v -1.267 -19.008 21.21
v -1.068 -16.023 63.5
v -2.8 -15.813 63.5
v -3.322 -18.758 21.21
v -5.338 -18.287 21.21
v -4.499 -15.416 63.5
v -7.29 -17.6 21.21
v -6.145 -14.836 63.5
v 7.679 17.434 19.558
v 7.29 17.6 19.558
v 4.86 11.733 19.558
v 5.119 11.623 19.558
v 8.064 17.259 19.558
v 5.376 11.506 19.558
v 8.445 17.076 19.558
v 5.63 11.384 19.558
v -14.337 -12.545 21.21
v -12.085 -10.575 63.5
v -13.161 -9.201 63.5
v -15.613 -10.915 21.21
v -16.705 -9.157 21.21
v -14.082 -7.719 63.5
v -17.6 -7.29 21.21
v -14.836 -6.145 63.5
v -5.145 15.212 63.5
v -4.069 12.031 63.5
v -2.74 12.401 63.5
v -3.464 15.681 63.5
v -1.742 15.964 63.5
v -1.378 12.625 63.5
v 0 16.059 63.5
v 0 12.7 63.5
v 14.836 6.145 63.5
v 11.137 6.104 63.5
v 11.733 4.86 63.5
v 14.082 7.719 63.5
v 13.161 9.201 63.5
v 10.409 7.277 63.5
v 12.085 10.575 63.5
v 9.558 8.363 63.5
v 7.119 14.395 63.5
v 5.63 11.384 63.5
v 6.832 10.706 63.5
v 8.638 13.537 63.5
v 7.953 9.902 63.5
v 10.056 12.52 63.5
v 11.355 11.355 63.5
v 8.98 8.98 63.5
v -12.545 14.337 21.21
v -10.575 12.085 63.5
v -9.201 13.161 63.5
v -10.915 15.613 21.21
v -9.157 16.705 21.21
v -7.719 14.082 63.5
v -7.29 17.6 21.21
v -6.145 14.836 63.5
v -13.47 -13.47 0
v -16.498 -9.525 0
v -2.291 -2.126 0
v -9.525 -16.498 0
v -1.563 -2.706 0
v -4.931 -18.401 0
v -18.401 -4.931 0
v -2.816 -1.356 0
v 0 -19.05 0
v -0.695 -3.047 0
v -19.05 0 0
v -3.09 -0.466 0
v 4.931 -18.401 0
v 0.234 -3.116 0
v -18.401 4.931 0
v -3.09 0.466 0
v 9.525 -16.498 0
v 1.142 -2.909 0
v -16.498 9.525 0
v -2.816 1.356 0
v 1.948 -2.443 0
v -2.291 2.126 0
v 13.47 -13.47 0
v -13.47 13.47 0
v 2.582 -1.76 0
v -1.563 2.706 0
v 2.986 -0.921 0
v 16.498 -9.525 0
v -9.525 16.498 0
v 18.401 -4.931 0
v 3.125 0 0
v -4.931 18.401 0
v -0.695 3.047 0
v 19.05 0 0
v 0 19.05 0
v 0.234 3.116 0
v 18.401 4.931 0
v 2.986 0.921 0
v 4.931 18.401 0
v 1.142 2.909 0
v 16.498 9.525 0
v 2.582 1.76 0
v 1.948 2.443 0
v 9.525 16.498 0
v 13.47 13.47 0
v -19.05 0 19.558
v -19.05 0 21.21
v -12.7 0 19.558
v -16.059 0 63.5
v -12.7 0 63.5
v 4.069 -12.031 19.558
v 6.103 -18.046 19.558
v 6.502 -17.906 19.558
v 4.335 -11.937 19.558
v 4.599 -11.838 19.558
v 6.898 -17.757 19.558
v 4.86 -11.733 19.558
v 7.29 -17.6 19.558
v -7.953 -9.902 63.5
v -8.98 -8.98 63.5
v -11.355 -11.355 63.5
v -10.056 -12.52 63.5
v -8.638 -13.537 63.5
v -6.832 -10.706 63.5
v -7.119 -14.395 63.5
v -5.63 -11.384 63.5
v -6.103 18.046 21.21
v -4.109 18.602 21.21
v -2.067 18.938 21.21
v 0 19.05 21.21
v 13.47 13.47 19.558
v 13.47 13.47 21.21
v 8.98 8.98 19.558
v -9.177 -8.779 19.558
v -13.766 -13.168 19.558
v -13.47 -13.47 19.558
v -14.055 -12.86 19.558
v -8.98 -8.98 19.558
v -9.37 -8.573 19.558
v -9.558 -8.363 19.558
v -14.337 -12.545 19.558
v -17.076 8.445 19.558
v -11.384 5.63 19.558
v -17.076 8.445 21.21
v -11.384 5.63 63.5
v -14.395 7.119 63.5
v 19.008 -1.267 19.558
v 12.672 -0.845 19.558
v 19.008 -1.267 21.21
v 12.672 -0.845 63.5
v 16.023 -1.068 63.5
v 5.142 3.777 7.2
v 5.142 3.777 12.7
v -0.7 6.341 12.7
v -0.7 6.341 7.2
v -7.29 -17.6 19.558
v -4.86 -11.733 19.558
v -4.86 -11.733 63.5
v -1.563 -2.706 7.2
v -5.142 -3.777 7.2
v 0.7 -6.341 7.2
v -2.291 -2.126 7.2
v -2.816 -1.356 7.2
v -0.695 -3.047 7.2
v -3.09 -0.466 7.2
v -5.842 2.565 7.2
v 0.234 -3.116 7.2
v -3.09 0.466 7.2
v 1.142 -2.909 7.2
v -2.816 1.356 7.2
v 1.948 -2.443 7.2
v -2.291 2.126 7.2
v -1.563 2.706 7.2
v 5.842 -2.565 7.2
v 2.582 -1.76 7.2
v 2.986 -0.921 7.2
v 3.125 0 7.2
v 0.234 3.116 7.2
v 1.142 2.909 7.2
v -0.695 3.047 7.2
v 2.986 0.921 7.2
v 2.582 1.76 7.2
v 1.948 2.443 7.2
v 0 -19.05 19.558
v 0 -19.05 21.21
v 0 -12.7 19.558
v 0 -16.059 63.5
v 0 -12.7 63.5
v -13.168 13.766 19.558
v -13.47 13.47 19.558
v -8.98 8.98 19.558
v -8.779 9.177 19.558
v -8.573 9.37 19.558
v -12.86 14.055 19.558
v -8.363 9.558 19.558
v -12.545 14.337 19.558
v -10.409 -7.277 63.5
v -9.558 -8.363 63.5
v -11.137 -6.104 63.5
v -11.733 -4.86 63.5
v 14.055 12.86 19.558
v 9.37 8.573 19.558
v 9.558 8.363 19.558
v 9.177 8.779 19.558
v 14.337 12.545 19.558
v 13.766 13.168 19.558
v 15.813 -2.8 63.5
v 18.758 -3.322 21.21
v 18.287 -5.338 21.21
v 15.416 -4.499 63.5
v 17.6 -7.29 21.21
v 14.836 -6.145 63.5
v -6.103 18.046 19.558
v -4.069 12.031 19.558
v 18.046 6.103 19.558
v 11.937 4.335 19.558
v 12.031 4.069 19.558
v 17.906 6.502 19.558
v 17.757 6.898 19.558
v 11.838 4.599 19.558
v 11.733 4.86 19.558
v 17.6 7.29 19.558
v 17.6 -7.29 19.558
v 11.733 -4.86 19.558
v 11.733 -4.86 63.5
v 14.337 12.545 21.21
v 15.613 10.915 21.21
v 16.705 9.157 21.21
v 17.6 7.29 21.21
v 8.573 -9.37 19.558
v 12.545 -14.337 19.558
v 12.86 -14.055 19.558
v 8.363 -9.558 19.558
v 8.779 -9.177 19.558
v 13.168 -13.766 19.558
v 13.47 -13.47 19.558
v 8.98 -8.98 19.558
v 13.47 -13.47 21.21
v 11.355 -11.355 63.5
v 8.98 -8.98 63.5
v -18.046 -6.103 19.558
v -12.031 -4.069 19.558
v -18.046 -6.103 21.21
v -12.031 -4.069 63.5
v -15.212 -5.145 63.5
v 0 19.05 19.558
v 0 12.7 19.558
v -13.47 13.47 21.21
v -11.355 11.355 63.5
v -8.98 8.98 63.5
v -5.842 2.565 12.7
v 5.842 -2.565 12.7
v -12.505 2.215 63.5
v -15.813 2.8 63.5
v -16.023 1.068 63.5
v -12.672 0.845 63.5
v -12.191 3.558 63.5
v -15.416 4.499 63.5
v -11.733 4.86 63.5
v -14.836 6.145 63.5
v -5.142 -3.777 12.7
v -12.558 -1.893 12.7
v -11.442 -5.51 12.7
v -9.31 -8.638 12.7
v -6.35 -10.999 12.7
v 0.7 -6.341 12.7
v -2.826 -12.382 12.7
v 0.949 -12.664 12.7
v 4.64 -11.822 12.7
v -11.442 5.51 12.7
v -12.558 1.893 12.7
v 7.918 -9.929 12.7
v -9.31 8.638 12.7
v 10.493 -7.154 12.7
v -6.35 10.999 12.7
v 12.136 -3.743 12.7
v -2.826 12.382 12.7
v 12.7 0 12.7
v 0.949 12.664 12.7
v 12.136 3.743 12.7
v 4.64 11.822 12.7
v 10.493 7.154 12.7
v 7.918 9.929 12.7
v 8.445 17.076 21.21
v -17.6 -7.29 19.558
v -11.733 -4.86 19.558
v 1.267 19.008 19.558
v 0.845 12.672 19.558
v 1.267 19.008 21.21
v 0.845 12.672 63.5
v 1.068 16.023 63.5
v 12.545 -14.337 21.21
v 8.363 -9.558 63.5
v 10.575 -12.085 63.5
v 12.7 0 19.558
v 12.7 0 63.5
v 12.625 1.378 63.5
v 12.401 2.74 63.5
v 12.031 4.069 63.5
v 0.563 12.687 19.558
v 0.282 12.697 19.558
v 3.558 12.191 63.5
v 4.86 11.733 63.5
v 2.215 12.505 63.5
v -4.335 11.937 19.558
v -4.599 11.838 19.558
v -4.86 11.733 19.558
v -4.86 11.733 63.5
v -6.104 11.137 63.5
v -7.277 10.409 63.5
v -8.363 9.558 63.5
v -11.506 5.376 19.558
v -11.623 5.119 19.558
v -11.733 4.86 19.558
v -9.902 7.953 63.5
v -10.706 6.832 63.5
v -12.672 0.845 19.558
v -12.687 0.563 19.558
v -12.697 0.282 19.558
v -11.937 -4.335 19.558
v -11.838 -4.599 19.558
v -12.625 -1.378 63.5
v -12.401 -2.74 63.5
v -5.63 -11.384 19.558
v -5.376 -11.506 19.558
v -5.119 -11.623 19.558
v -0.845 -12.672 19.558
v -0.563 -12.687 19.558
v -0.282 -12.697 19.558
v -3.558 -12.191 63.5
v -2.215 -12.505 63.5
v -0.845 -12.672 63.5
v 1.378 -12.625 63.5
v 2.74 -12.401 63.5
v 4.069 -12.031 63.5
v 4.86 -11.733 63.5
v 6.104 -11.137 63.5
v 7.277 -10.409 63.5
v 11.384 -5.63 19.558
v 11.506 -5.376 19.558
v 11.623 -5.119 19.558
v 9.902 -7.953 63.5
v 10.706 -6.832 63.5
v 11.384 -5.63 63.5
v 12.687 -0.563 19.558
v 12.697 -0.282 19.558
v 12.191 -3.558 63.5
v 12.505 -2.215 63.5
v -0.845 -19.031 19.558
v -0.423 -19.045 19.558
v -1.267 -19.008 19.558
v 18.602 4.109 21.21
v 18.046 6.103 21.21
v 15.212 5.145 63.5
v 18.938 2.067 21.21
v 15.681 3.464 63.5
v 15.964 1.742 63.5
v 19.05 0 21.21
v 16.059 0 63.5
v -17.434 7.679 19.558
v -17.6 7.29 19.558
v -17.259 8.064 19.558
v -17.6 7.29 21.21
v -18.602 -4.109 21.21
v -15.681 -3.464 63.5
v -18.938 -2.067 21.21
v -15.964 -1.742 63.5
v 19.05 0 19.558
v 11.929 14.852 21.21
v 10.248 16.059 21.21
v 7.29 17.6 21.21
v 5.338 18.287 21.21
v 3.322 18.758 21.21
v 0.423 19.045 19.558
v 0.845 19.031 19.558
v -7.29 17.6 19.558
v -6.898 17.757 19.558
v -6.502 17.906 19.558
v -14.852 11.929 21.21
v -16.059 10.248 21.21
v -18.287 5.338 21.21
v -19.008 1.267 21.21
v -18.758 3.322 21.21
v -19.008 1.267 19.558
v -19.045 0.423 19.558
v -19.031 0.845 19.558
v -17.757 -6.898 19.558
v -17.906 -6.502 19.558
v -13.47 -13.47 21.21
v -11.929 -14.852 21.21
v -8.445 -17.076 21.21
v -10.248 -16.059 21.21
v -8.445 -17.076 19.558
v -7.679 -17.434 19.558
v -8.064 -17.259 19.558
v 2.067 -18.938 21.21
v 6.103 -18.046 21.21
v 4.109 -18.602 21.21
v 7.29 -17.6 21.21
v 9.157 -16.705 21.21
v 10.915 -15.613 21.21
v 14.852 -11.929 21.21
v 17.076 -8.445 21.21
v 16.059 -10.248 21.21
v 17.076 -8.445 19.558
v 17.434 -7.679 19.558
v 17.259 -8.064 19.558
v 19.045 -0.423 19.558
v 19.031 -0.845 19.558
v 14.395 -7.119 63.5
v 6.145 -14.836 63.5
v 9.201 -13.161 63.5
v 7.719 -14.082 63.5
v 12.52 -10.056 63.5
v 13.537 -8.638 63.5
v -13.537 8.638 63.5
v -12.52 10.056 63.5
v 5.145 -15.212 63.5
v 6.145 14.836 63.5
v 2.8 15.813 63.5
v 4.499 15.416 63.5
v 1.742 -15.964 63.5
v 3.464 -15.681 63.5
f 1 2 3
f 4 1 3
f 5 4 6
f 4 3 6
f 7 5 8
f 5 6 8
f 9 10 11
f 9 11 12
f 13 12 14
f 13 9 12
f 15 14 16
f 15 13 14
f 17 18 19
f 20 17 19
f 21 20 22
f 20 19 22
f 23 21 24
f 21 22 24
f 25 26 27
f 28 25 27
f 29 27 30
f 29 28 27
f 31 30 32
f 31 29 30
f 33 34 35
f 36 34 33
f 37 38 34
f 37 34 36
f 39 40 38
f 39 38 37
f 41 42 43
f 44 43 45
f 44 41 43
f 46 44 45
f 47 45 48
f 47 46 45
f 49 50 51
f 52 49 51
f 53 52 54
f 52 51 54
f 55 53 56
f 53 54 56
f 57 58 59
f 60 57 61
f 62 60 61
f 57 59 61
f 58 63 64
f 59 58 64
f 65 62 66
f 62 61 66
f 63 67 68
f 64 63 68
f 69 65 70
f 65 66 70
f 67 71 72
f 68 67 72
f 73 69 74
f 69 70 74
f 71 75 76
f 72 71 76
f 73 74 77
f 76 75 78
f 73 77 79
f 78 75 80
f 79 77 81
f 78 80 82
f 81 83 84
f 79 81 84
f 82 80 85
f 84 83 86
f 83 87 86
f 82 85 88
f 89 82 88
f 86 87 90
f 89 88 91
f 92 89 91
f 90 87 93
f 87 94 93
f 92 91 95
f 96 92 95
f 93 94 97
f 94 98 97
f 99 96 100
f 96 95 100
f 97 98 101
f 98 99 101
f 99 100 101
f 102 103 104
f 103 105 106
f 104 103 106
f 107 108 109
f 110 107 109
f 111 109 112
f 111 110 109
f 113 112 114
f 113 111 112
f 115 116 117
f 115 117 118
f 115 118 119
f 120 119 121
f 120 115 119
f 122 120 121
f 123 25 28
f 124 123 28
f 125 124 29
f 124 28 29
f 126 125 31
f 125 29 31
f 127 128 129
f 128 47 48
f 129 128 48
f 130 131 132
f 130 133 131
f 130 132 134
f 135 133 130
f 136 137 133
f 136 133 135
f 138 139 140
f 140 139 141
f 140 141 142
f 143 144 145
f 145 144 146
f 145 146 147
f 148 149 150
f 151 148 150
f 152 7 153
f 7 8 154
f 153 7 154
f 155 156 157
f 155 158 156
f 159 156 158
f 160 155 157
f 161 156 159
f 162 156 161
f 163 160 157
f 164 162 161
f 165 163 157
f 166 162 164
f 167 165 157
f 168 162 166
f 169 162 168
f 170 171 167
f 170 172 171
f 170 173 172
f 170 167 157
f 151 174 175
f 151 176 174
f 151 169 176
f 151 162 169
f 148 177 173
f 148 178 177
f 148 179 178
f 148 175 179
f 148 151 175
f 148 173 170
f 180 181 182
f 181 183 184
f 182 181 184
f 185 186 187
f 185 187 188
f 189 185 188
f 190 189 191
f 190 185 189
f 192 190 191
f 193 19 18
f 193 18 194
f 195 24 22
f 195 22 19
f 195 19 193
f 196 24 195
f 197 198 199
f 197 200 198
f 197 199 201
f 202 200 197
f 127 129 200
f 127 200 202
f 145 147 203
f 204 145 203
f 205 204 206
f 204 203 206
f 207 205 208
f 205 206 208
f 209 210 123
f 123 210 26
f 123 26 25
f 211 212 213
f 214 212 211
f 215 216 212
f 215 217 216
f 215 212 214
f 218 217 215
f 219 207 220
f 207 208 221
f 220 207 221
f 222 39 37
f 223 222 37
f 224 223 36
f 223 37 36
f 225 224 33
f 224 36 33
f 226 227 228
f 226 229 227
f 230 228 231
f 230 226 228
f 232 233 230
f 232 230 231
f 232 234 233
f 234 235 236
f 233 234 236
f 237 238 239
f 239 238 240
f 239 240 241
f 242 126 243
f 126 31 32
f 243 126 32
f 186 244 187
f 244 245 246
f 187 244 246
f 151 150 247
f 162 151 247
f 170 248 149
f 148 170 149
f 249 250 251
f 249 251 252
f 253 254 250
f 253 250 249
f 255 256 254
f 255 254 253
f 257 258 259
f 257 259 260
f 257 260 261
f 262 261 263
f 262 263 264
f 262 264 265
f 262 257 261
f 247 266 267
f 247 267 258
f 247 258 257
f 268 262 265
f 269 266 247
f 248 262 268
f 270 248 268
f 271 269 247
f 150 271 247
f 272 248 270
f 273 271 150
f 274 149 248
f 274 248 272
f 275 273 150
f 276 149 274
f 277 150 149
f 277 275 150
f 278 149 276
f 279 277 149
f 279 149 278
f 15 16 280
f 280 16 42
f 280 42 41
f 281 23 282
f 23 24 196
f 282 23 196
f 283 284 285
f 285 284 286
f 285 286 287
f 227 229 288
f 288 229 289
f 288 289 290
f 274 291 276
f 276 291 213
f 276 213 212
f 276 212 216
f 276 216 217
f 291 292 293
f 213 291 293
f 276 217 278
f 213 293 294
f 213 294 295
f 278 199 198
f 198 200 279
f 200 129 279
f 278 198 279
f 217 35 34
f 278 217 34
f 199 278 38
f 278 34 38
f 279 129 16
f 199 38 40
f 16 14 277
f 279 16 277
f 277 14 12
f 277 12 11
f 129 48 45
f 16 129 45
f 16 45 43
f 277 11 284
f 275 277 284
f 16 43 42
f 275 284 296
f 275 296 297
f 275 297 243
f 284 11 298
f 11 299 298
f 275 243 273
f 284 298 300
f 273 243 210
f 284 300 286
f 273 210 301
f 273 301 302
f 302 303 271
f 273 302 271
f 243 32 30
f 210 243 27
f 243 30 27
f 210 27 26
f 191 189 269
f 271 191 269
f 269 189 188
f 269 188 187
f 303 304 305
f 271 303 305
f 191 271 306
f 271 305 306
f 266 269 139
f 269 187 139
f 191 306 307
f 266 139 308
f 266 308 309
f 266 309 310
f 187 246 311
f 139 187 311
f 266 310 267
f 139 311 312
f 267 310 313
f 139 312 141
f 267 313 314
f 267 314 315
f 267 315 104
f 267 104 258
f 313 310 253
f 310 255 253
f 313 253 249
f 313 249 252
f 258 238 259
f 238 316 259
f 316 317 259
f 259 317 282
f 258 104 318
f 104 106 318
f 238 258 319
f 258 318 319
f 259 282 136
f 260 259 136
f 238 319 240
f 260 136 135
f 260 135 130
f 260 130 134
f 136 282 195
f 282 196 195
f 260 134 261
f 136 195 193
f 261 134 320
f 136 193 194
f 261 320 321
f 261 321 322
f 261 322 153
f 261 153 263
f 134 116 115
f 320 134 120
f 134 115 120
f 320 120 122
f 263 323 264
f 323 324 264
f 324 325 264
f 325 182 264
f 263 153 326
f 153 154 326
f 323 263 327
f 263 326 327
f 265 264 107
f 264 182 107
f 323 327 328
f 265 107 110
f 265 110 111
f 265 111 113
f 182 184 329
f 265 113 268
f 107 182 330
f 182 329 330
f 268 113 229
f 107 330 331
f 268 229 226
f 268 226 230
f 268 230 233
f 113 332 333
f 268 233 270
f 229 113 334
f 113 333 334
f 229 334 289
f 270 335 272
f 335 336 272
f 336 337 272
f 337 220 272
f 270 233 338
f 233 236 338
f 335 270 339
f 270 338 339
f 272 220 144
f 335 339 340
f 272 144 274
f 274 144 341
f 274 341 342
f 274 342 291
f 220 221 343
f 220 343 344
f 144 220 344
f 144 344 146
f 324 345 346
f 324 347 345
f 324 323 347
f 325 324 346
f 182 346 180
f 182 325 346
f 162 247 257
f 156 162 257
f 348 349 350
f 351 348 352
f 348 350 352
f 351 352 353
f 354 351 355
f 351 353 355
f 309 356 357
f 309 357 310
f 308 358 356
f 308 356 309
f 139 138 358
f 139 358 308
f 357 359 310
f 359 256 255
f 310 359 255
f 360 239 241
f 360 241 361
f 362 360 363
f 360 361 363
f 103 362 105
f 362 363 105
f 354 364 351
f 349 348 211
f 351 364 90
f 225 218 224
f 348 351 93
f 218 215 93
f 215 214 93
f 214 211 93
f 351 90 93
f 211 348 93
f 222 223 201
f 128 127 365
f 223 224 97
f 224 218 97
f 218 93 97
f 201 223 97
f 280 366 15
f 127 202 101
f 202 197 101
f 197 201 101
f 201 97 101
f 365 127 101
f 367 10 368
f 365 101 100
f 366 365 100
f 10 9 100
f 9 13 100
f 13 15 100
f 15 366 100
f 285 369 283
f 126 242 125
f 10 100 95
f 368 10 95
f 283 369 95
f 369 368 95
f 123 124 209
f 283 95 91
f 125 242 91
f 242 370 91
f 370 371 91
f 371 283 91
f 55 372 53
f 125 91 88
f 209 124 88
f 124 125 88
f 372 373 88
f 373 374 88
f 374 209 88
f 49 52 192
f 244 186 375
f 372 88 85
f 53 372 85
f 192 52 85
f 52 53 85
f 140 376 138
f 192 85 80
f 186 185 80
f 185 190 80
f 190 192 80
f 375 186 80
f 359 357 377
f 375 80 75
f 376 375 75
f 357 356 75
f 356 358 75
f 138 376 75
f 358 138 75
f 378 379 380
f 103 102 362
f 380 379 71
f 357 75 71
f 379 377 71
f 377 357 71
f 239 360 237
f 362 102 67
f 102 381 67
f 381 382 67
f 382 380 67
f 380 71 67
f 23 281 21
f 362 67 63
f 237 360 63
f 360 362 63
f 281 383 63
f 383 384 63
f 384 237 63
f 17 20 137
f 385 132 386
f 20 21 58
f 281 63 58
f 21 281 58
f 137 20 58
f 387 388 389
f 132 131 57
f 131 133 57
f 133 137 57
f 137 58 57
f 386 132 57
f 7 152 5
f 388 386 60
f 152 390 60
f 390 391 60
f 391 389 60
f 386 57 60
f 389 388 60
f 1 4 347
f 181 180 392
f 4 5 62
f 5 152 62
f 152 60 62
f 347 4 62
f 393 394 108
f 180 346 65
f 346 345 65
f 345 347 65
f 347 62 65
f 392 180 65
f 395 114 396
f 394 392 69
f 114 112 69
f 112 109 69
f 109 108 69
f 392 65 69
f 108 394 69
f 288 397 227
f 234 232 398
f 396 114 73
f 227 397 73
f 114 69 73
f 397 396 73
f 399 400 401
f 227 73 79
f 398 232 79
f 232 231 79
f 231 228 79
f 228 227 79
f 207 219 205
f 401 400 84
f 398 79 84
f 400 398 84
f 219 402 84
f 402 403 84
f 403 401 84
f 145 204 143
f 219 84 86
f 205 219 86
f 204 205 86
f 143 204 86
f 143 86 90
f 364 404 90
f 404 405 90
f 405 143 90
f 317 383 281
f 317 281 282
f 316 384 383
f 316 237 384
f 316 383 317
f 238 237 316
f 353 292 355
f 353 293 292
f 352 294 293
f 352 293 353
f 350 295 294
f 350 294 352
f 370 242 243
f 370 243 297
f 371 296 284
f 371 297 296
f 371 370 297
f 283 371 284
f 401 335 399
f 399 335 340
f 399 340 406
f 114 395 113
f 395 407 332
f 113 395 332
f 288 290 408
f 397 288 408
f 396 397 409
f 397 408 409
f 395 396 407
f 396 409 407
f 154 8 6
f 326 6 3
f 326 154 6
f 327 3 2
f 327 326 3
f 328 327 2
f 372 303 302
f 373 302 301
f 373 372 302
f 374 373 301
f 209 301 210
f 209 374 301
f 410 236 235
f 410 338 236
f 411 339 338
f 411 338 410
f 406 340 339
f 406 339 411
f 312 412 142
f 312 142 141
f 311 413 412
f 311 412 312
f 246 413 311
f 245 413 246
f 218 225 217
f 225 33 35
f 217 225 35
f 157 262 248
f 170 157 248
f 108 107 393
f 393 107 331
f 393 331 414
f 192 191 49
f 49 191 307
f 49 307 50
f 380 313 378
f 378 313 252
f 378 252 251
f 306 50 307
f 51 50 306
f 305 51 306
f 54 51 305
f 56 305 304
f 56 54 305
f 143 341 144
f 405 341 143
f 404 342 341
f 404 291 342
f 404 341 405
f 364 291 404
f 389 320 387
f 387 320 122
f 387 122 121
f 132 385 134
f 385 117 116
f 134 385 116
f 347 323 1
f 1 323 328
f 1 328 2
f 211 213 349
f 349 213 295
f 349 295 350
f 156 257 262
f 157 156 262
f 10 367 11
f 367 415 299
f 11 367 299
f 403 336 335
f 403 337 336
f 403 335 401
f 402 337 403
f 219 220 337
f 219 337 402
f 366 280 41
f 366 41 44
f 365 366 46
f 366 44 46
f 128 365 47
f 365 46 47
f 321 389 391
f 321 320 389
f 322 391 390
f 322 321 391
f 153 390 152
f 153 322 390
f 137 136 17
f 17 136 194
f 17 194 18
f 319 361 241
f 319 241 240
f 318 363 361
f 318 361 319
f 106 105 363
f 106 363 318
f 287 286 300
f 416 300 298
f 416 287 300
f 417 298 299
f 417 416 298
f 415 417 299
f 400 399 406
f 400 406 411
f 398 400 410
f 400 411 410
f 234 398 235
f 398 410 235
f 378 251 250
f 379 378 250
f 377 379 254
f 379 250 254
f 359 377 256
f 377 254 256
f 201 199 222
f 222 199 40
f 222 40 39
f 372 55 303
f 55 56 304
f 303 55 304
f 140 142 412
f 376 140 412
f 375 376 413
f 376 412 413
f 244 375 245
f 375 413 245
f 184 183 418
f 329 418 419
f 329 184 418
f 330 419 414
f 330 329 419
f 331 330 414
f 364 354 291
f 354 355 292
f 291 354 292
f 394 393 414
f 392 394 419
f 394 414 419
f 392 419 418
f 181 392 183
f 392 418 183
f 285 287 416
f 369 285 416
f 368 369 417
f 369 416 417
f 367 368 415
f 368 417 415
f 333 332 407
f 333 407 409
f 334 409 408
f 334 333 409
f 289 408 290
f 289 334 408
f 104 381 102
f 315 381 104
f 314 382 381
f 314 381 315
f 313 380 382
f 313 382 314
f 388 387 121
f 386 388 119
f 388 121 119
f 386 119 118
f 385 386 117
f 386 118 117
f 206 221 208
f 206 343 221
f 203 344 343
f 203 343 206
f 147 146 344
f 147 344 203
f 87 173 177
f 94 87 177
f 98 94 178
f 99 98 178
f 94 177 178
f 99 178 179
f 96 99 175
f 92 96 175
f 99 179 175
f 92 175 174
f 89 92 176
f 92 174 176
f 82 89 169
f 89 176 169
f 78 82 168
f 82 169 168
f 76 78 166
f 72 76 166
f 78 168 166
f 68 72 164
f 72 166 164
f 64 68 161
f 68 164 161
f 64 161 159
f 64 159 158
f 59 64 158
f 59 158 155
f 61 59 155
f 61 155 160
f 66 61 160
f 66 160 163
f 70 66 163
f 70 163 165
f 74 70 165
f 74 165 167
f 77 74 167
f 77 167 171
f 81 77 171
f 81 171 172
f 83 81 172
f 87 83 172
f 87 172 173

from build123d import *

# Parameters (mm, degrees)
F0_R      = 19.05
F1_DEPTH  = 63.5
F3_R      = 12.7
F4_DEPTH  = 50.8
F6_DEPTH  = 43.942
F7_R      = 3.125
F8_DEPTH  = 53.594
F10_DEPTH = 5.5


with BuildPart() as f1:
    # F0 (on Top) → F1 (new body)
    with BuildSketch(Plane.XY):
        Circle(F0_R)
    extrude(amount=F1_DEPTH)

    # F3 (on face) → F4 (cut)
    with BuildSketch(Plane.XY.offset(63.5)):
        Circle(F3_R)
    extrude(amount=-F4_DEPTH, mode=Mode.SUBTRACT)

    # F5 (on face) → F6 (cut)
    with BuildSketch(Plane.XY.offset(63.5)):
        Polygon((0, 38.1), (0, 0), (2.54, 38.1), align=None)
        Polygon((-14.580239, 35.19981), (0, 0), (-12.233585, 36.171826), align=None)
        Polygon((-26.940768, 26.940768), (0, 0), (-25.144717, 28.73682), align=None)
        Polygon((-35.19981, 14.580239), (0, 0), (-34.227794, 16.926893), align=None)
        Polygon((-38.1, 0), (0, 0), (-38.1, 2.54), align=None)
        Polygon((-35.19981, -14.580239), (0, 0), (-36.171826, -12.233585), align=None)
        Polygon((-26.940768, -26.940768), (0, 0), (-28.73682, -25.144717), align=None)
        Polygon((-14.580239, -35.19981), (0, 0), (-16.926893, -34.227794), align=None)
        Polygon((0, -38.1), (0, 0), (-2.54, -38.1), align=None)
        Polygon((14.580239, -35.19981), (0, 0), (12.233585, -36.171826), align=None)
        Polygon((26.940768, -26.940768), (0, 0), (25.144717, -28.73682), align=None)
        Polygon((35.19981, -14.580239), (0, 0), (34.227794, -16.926893), align=None)
        Polygon((38.1, 0), (0, 0), (38.1, -2.54), align=None)
        Polygon((35.19981, 14.580239), (0, 0), (36.171826, 12.233585), align=None)
        Polygon((26.940768, 26.940768), (0, 0), (28.73682, 25.144717), align=None)
        Polygon((14.580239, 35.19981), (0, 0), (16.926893, 34.227794), align=None)
    extrude(amount=-F6_DEPTH, mode=Mode.SUBTRACT)

    # F7 (on face) → F8 (cut)
    with BuildSketch(Plane.XY.offset(12.7)):
        Circle(F7_R)
    extrude(amount=-F8_DEPTH, mode=Mode.SUBTRACT)

    # F9 (on face) → F10 (cut)
    with BuildSketch(Plane.XY.offset(12.7)):
        Polygon((0.699814, -6.341222), (5.841566, -2.564554), (5.141752, 3.776668), (-0.699814, 6.341222), (-5.841566, 2.564554), (-5.141752, -3.776668), align=None)
    extrude(amount=-F10_DEPTH, mode=Mode.SUBTRACT)

    # F11 (on Right) → F12 (revolve, cut)
    with BuildSketch(Plane.YZ):
        Polygon((-16.030312, 63.901735), (-19.12548, 63.898501), (-19.12548, 20.142671), align=None)
    revolve(axis=Axis((0, 0, -11.778668), (0, 0, -1)), mode=Mode.SUBTRACT)


solid = f1.part
